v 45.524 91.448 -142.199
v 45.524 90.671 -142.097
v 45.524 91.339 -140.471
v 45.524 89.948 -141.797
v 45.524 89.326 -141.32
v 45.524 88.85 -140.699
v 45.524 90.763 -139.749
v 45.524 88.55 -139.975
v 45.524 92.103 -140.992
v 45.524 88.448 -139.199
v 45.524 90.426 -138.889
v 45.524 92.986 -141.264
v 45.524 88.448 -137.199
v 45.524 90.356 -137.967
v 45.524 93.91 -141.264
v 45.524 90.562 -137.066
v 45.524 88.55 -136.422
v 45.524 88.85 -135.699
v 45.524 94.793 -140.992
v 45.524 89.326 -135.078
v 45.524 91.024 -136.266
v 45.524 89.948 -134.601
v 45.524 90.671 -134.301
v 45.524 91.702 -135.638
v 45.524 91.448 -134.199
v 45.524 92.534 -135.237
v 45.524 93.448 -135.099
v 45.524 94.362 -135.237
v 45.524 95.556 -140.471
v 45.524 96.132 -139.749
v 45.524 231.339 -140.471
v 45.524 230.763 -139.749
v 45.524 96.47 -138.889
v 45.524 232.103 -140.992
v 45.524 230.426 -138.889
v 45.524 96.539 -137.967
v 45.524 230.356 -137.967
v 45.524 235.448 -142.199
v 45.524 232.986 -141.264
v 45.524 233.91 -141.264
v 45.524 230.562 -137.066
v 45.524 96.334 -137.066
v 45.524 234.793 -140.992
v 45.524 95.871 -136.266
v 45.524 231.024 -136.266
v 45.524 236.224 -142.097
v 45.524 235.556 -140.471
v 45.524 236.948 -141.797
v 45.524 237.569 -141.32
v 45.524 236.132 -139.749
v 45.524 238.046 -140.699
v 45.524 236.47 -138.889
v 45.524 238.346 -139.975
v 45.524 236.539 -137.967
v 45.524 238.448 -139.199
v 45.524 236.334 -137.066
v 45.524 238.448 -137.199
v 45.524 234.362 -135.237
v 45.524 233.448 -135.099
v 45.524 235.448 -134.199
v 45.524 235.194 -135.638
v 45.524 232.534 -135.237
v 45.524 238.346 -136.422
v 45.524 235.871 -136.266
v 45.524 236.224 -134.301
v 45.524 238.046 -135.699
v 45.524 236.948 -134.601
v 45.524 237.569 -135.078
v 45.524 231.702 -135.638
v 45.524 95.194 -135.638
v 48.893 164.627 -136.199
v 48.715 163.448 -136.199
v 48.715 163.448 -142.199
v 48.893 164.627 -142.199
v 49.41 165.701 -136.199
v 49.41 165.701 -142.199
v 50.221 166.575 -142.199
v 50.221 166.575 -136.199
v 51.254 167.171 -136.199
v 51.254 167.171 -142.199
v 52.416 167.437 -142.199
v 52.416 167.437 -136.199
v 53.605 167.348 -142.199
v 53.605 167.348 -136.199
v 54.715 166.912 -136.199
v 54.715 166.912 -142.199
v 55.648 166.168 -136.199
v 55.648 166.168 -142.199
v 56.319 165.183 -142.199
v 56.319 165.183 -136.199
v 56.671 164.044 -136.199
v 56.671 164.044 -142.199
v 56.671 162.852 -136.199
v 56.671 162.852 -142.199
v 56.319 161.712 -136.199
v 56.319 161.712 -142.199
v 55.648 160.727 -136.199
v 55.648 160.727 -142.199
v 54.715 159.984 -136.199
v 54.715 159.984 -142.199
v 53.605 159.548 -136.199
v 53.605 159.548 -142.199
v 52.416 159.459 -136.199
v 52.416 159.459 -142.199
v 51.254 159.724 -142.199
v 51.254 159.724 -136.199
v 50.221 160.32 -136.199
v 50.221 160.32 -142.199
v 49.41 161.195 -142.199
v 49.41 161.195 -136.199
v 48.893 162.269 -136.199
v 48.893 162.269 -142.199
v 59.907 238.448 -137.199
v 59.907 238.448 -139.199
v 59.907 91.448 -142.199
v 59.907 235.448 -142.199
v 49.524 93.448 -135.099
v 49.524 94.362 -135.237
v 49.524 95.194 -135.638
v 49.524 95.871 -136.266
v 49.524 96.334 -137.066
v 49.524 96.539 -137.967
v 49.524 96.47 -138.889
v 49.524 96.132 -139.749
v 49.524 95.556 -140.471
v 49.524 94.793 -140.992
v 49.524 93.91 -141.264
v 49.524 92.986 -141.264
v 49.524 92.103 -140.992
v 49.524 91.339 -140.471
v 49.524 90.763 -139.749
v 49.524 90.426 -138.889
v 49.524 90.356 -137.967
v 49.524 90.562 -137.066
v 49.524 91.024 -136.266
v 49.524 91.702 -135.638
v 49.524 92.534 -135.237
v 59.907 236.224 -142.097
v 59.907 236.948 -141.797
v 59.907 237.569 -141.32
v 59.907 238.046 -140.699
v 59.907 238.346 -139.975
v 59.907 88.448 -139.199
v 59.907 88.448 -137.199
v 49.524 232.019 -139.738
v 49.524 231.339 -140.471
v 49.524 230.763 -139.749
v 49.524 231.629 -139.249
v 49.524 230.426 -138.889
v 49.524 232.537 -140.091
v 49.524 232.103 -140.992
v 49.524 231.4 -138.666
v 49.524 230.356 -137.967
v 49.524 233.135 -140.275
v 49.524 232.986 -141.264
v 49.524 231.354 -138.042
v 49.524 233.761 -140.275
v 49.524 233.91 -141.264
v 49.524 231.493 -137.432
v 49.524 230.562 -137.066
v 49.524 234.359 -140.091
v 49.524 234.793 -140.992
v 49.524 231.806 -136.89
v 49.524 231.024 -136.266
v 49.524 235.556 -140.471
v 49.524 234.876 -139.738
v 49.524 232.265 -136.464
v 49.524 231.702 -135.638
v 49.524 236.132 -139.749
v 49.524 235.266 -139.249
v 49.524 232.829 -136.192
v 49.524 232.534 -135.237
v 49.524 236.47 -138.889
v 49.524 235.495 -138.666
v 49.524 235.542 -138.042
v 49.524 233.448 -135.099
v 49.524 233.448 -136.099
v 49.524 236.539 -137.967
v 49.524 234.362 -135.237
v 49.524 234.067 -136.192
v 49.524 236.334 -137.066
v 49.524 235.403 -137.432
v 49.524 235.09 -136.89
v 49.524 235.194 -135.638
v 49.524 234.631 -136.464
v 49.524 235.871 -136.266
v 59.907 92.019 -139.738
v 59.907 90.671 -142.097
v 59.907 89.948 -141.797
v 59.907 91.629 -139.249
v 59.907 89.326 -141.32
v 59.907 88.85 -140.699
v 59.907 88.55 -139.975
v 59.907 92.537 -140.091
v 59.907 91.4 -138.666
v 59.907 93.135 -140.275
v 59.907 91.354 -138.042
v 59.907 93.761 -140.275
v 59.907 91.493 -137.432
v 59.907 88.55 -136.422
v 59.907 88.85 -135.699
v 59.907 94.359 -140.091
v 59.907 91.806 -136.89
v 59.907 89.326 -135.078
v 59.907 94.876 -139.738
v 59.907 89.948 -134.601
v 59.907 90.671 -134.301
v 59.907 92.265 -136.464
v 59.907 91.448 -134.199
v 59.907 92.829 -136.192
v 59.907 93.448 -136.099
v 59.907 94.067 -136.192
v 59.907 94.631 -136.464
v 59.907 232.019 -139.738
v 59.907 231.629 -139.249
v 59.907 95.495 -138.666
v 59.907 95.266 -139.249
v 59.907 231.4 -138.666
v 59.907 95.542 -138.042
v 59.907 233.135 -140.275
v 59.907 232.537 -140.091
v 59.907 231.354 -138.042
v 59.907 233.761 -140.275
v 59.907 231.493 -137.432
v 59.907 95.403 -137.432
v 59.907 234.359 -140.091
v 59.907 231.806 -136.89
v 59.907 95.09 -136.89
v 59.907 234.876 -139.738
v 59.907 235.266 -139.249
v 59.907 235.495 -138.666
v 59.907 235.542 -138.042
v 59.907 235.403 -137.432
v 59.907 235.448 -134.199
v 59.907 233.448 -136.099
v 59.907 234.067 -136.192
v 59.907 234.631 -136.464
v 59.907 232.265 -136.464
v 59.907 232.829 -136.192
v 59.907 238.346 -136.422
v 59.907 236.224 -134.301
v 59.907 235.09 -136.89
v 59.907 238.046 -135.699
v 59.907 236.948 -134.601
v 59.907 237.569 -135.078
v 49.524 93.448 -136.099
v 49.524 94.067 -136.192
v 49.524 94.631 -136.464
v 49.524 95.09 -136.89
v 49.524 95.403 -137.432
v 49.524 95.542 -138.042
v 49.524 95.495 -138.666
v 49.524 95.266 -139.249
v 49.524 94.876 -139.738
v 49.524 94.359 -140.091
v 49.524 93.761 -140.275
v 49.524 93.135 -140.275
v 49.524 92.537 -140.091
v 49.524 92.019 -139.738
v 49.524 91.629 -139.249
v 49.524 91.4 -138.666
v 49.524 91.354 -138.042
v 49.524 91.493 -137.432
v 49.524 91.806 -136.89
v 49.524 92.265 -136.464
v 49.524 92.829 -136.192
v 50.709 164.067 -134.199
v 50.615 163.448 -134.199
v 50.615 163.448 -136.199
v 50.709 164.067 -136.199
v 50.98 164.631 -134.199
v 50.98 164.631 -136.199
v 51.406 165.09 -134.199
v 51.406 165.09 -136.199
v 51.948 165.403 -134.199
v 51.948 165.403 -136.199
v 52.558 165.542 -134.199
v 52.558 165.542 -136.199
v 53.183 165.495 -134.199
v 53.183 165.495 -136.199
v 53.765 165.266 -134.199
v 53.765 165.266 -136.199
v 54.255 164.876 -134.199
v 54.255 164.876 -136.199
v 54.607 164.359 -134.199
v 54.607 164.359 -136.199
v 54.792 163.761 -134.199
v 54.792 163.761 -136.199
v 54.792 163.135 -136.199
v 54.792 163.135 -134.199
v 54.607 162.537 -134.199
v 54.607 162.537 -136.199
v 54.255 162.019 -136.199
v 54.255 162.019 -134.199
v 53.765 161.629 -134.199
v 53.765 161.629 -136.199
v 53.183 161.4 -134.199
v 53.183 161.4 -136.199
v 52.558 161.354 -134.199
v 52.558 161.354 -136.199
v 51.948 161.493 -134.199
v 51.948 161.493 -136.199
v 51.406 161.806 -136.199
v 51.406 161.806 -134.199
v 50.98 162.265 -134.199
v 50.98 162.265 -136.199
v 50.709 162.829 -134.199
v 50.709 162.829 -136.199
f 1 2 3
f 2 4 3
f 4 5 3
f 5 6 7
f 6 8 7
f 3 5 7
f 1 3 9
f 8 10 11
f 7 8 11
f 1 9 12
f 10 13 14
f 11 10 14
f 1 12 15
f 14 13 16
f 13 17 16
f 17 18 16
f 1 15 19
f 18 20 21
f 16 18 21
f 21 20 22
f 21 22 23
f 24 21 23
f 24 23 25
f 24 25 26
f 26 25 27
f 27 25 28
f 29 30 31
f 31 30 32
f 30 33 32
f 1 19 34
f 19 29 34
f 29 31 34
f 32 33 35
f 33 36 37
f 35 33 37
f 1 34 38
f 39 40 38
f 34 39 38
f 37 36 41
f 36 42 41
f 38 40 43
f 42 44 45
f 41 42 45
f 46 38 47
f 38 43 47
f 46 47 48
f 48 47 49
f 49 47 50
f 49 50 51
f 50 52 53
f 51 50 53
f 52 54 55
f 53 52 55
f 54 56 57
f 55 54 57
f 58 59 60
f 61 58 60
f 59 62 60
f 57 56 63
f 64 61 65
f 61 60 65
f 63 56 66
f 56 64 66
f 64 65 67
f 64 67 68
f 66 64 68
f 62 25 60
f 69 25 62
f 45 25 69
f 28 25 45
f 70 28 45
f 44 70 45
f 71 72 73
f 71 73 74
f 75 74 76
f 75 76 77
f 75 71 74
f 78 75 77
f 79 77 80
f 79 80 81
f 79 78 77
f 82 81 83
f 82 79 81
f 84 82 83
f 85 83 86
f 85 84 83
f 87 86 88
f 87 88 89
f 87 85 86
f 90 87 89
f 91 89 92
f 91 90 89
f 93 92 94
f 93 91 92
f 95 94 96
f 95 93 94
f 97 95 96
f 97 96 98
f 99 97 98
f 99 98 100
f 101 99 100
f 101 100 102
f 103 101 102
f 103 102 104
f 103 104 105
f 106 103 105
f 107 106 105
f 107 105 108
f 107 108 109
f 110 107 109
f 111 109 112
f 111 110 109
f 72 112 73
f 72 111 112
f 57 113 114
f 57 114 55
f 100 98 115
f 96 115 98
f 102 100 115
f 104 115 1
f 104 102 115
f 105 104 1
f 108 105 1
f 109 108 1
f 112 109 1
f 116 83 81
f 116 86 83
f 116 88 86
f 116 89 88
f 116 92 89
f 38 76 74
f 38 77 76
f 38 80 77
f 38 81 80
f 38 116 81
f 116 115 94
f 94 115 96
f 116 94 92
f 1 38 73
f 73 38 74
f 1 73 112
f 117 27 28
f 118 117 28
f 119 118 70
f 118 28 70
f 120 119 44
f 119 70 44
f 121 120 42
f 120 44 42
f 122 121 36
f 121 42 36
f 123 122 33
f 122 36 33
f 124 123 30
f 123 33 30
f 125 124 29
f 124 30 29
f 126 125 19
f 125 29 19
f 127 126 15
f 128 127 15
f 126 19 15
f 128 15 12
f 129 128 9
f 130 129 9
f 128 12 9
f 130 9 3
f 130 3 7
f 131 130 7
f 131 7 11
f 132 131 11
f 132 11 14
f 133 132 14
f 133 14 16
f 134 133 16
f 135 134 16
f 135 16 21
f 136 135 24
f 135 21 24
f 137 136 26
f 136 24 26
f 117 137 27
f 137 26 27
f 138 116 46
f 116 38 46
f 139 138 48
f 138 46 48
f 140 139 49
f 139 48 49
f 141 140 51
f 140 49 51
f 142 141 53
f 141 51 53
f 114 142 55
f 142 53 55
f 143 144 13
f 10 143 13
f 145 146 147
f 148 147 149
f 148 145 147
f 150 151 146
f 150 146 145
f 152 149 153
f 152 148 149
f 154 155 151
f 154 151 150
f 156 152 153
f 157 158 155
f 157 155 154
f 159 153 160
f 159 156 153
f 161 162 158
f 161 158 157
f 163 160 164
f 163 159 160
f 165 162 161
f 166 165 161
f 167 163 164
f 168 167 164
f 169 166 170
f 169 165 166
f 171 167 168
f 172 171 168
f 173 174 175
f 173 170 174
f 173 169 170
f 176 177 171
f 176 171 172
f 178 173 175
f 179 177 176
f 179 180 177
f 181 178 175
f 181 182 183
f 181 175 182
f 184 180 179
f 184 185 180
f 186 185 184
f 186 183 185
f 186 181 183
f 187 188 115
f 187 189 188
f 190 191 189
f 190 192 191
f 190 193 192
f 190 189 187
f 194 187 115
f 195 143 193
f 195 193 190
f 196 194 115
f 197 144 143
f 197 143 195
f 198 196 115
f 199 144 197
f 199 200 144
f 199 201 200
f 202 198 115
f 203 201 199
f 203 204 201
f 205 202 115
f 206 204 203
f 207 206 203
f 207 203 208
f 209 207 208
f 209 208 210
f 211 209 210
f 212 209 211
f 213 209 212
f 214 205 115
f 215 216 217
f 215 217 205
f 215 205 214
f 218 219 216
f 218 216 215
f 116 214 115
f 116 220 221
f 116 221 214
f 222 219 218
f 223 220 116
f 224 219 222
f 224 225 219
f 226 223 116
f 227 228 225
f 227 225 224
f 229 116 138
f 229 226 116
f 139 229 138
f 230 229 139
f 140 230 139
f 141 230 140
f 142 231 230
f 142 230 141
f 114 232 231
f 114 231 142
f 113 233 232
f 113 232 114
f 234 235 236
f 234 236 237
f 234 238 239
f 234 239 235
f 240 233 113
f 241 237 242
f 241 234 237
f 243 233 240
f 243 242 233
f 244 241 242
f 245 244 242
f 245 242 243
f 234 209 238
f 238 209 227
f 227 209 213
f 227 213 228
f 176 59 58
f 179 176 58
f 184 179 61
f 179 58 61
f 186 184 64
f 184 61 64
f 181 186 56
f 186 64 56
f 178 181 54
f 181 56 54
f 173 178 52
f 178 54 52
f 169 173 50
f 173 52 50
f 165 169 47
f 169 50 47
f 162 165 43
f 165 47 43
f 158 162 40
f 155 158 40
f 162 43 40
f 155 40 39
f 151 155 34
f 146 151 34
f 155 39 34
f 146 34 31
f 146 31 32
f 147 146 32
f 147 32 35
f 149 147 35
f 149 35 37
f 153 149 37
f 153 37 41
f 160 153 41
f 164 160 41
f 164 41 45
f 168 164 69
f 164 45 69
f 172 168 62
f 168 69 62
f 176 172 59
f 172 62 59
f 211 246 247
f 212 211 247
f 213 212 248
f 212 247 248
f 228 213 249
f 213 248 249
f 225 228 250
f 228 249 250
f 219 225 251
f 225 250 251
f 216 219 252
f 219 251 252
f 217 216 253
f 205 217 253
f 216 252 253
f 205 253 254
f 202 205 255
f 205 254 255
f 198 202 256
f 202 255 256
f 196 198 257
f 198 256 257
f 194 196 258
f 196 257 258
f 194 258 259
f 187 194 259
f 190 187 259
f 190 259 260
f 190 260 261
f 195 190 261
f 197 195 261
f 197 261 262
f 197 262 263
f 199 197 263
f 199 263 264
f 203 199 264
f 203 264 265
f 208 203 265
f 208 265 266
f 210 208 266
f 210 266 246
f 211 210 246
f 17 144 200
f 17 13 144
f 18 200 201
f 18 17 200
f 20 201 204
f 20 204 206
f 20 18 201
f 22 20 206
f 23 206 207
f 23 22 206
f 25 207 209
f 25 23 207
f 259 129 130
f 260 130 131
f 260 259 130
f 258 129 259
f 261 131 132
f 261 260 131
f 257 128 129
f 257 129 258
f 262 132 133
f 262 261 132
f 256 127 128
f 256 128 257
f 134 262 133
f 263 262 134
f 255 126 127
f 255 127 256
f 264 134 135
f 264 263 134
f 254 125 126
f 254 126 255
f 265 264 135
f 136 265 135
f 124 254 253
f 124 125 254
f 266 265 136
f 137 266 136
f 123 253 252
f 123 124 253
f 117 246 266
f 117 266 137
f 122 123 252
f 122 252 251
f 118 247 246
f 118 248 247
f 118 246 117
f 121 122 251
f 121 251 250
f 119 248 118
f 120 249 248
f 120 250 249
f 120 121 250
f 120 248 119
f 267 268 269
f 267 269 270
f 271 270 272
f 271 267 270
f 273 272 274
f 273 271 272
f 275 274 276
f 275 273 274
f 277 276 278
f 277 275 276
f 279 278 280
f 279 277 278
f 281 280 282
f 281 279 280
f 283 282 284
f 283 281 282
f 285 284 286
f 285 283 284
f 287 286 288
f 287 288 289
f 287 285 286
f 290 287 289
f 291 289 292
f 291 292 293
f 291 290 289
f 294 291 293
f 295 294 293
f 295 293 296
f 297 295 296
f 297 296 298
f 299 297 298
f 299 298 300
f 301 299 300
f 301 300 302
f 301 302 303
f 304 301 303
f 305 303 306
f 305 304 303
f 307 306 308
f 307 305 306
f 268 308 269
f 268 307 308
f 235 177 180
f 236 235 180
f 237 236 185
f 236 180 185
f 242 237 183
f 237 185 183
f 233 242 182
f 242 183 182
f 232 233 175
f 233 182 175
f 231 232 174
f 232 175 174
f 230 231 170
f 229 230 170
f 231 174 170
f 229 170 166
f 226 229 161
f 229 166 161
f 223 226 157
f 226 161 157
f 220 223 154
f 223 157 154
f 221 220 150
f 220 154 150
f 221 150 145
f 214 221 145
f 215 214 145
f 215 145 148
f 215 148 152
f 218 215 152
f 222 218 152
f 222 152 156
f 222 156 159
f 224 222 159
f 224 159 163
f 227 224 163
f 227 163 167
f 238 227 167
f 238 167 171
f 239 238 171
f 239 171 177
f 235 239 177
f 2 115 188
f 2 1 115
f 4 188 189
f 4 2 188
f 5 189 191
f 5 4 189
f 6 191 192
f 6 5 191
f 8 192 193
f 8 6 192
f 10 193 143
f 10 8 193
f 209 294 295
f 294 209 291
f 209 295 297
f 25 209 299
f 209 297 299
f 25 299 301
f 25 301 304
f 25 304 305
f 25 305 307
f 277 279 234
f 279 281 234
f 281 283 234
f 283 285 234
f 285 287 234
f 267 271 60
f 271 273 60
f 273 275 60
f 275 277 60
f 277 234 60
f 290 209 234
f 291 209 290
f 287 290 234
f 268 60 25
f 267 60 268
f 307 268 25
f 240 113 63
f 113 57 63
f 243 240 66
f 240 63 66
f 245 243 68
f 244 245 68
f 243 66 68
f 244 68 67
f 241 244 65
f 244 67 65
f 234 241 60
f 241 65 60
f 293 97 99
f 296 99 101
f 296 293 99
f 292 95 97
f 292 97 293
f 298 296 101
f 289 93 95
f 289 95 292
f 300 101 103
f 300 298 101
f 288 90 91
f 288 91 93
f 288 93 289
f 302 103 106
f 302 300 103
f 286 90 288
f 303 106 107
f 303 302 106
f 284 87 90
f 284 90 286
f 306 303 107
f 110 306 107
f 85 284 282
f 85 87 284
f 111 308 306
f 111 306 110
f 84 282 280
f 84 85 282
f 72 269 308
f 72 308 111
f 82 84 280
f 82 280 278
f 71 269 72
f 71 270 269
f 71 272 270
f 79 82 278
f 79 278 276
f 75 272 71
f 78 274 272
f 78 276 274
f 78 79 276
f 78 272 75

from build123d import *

# Parameters (mm, degrees)
CROQUIS1_W              = 14.382940013
CROQUIS1_H              = 150
CROQUIS1_W_2            = 10
CROQUIS1_H_2            = 20
CROQUIS1_R              = 3.1
CROQUIS1_R_2            = 2.1
SALIENTE_EXTRUIR1_DEPTH = 2
CROQUIS2_W              = 14.382940013
CROQUIS2_H              = 150
CROQUIS2_R              = 4
SALIENTE_EXTRUIR2_DEPTH = 6
CROQUIS3_R              = 3.1
CORTAR_EXTRUIR1_DEPTH   = 4
CROQUIS4_R              = 2.1
CORTAR_EXTRUIR2_DEPTH   = 278.82310565
REDONDEO2_R             = 3


with BuildPart() as part:
    # Croquis1 → Saliente-Extruir1 (new body)
    # profile 1 of 3: a face of its own
    with BuildSketch(Plane(origin=(0, 0, -134.198862982), x_dir=(-1, 0, 0), z_dir=(0, 0, -1))):
        with Locations((-52.715326076, 163.447805519)):
            Rectangle(CROQUIS1_W, CROQUIS1_H)
        with Locations((-52.715326075, 163.447805519)):
            Rectangle(CROQUIS1_W_2, CROQUIS1_H_2, mode=Mode.SUBTRACT)
    # profile 2 of 3: a face of its own
    with BuildSketch(Plane(origin=(0, 0, -134.198862982), x_dir=(-1, 0, 0), z_dir=(0, 0, -1))):
        with Locations((-52.715326075, 163.447805519)):
            Rectangle(CROQUIS1_W_2, CROQUIS1_H_2)
        with Locations((-52.715326075, 163.447805519)):
            Circle(CROQUIS1_R, mode=Mode.SUBTRACT)
    # profile 3 of 3: a face of its own
    with BuildSketch(Plane(origin=(0, 0, -134.198862982), x_dir=(-1, 0, 0), z_dir=(0, 0, -1))):
        with Locations((-52.715326075, 163.447805519)):
            Circle(CROQUIS1_R)
        with Locations((-52.715326075, 163.447805519)):
            Circle(CROQUIS1_R_2, mode=Mode.SUBTRACT)
    extrude(amount=SALIENTE_EXTRUIR1_DEPTH)

    # Croquis2 → Saliente-Extruir2 (add)
    with BuildSketch(Plane(origin=(0, 0, -136.198862982), x_dir=(-1, 0, 0), z_dir=(0, 0, -1))):
        with Locations((-52.715326076, 163.447805519)):
            Rectangle(CROQUIS2_W, CROQUIS2_H)
        with Locations((-52.715326075, 163.447805519)):
            Circle(CROQUIS2_R, mode=Mode.SUBTRACT)
    extrude(amount=SALIENTE_EXTRUIR2_DEPTH)

    # Croquis3 → Cortar-Extruir1 (cut)
    with BuildSketch(Plane.ZY.offset(-45.523856069)):
        with Locations((-138.198862982, 93.447805519)):
            Circle(CROQUIS3_R)
        with Locations((-138.198862982, 233.447805519)):
            Circle(CROQUIS3_R)
    extrude(amount=-CORTAR_EXTRUIR1_DEPTH, mode=Mode.SUBTRACT)

    # Croquis4 → Cortar-Extruir2 (cut, through all)
    with BuildSketch(Plane.ZY.offset(-49.523856069)):
        with Locations((-138.198862982, 233.447805519)):
            Circle(CROQUIS4_R)
        with Locations((-138.198862982, 93.447805519)):
            Circle(CROQUIS4_R)
    extrude(amount=-CORTAR_EXTRUIR2_DEPTH, mode=Mode.SUBTRACT)

    # Redondeo2
    redondeo2_edges = [part.edges().sort_by_distance(p)[0] for p in [
        (52.715326075, 88.447805519, -142.198862982),
        (52.715326075, 238.447805519, -142.198862982),
        (52.715326075, 238.447805519, -134.198862982),
        (52.715326075, 88.447805519, -134.198862982),
    ]]
    fillet(redondeo2_edges, radius=REDONDEO2_R)


solid = part.part
